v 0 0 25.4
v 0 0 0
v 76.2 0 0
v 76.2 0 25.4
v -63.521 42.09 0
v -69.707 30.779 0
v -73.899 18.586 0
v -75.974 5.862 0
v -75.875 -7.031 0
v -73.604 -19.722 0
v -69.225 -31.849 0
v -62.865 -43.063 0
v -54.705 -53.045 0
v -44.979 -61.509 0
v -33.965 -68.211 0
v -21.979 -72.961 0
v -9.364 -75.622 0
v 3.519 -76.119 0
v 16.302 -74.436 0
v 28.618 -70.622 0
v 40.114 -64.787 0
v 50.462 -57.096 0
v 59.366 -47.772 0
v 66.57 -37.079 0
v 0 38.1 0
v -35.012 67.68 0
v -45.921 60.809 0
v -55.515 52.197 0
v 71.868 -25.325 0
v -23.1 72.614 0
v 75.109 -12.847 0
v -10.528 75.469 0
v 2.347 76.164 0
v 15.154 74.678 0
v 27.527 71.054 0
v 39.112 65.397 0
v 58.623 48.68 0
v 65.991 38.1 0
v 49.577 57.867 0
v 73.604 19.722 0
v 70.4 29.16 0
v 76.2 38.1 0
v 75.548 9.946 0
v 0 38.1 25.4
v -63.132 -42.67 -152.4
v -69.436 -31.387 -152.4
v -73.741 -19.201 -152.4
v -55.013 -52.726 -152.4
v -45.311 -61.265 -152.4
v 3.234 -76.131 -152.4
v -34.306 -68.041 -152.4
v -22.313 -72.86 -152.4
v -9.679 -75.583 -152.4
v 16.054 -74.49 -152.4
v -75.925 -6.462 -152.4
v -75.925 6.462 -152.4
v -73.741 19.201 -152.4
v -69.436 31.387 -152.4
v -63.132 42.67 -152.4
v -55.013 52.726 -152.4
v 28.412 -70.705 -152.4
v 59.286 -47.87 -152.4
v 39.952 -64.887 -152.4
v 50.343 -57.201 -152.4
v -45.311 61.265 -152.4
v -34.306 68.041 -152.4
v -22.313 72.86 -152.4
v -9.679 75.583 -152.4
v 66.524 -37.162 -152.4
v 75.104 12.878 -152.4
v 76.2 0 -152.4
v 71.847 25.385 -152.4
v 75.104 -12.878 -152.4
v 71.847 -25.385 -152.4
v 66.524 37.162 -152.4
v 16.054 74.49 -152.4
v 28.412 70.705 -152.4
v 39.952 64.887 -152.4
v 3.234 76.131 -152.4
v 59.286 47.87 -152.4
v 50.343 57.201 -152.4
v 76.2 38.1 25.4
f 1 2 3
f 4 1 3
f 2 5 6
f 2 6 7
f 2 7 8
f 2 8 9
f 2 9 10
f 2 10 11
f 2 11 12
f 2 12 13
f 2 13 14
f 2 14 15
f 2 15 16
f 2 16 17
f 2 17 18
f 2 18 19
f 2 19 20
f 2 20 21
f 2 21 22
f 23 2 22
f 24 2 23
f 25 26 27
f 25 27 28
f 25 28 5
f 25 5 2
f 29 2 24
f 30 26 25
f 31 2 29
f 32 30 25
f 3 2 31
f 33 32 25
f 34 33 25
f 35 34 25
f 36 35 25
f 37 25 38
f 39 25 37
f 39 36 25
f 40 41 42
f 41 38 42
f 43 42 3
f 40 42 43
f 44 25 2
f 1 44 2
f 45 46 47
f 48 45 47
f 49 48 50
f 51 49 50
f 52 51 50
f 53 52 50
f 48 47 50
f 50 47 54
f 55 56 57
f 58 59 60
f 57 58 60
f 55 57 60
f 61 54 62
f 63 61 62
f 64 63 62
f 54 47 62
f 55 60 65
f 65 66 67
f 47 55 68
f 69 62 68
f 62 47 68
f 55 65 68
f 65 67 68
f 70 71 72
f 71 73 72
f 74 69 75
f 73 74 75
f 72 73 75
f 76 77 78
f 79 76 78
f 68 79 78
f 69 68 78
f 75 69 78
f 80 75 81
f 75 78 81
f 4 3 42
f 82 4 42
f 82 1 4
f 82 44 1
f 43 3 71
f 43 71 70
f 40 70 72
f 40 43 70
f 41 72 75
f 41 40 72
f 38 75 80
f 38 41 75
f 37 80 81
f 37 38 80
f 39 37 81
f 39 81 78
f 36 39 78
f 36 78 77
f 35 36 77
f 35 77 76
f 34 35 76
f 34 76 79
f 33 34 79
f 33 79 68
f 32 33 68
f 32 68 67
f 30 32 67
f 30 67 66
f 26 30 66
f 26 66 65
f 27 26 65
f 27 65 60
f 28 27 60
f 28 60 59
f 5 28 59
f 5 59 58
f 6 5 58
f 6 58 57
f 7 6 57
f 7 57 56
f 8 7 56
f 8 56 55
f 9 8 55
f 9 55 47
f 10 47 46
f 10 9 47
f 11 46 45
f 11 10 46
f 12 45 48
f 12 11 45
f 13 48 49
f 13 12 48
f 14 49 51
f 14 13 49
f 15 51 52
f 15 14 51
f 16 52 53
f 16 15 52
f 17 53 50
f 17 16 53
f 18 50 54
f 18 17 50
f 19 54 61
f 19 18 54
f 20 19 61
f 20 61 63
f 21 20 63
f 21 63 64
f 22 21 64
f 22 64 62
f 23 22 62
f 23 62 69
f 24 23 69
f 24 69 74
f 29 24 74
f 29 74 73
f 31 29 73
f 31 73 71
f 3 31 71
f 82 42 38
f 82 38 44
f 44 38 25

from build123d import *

# Parameters (mm, degrees)
F2_DEPTH = 25.4
F0_R     = 76.2
F3_DEPTH = 152.4
F4_DEPTH = 152.4


# Not quite as in the source:
# - an extrude ends at something that could not be found from the text; its depth is read off the source's solid


with BuildPart() as f2:
    # F1 (on Top) → F2 (new body)
    with BuildSketch(Plane.XY):
        with BuildLine():
            Line((0, 19.05), (0, 0))
            Line((0, 0), (19.05, 0))
            ThreePointArc((19.05, 0), (5.5796158184, 5.5796158184), (0, 19.05))
        make_face()
        with BuildLine():
            ThreePointArc((0, 19.05), (5.5796158184, 5.5796158184), (19.05, 0))
            Line((19.05, 0), (57.15, 0))
            ThreePointArc((57.15, 0), (70.6203841816, 5.5796158184), (76.2, 19.05))
            ThreePointArc((76.2, 19.05), (70.6203841816, 32.5203841816), (57.15, 38.1))
            Line((57.15, 38.1), (19.05, 38.1))
            ThreePointArc((19.05, 38.1), (5.5796158184, 32.5203841816), (0, 19.05))
        make_face()
        with BuildLine():
            Line((0, 38.1), (0, 19.05))
            ThreePointArc((0, 19.05), (5.5796158184, 32.5203841816), (19.05, 38.1))
            Line((19.05, 38.1), (0, 38.1))
        make_face()
        with BuildLine():
            ThreePointArc((76.2, 19.05), (70.6203841816, 5.5796158184), (57.15, 0))
            Line((57.15, 0), (76.2, 0))
            Line((76.2, 0), (76.2, 19.05))
        make_face()
        with BuildLine():
            ThreePointArc((57.15, 38.1), (70.6203841816, 32.5203841816), (76.2, 19.05))
            Line((76.2, 19.05), (76.2, 38.1))
            Line((76.2, 38.1), (57.15, 38.1))
        make_face()
    extrude(amount=F2_DEPTH)

    # F0 (on Top) → F3 (join, through all)
    with BuildSketch(Plane.XY):
        Circle(F0_R)
    extrude(amount=-F3_DEPTH)

    # F0 (on Top) → F4 (join)
    with BuildSketch(Plane.XY):
        Circle(F0_R)
    extrude(amount=-F4_DEPTH)


solid = f2.part
